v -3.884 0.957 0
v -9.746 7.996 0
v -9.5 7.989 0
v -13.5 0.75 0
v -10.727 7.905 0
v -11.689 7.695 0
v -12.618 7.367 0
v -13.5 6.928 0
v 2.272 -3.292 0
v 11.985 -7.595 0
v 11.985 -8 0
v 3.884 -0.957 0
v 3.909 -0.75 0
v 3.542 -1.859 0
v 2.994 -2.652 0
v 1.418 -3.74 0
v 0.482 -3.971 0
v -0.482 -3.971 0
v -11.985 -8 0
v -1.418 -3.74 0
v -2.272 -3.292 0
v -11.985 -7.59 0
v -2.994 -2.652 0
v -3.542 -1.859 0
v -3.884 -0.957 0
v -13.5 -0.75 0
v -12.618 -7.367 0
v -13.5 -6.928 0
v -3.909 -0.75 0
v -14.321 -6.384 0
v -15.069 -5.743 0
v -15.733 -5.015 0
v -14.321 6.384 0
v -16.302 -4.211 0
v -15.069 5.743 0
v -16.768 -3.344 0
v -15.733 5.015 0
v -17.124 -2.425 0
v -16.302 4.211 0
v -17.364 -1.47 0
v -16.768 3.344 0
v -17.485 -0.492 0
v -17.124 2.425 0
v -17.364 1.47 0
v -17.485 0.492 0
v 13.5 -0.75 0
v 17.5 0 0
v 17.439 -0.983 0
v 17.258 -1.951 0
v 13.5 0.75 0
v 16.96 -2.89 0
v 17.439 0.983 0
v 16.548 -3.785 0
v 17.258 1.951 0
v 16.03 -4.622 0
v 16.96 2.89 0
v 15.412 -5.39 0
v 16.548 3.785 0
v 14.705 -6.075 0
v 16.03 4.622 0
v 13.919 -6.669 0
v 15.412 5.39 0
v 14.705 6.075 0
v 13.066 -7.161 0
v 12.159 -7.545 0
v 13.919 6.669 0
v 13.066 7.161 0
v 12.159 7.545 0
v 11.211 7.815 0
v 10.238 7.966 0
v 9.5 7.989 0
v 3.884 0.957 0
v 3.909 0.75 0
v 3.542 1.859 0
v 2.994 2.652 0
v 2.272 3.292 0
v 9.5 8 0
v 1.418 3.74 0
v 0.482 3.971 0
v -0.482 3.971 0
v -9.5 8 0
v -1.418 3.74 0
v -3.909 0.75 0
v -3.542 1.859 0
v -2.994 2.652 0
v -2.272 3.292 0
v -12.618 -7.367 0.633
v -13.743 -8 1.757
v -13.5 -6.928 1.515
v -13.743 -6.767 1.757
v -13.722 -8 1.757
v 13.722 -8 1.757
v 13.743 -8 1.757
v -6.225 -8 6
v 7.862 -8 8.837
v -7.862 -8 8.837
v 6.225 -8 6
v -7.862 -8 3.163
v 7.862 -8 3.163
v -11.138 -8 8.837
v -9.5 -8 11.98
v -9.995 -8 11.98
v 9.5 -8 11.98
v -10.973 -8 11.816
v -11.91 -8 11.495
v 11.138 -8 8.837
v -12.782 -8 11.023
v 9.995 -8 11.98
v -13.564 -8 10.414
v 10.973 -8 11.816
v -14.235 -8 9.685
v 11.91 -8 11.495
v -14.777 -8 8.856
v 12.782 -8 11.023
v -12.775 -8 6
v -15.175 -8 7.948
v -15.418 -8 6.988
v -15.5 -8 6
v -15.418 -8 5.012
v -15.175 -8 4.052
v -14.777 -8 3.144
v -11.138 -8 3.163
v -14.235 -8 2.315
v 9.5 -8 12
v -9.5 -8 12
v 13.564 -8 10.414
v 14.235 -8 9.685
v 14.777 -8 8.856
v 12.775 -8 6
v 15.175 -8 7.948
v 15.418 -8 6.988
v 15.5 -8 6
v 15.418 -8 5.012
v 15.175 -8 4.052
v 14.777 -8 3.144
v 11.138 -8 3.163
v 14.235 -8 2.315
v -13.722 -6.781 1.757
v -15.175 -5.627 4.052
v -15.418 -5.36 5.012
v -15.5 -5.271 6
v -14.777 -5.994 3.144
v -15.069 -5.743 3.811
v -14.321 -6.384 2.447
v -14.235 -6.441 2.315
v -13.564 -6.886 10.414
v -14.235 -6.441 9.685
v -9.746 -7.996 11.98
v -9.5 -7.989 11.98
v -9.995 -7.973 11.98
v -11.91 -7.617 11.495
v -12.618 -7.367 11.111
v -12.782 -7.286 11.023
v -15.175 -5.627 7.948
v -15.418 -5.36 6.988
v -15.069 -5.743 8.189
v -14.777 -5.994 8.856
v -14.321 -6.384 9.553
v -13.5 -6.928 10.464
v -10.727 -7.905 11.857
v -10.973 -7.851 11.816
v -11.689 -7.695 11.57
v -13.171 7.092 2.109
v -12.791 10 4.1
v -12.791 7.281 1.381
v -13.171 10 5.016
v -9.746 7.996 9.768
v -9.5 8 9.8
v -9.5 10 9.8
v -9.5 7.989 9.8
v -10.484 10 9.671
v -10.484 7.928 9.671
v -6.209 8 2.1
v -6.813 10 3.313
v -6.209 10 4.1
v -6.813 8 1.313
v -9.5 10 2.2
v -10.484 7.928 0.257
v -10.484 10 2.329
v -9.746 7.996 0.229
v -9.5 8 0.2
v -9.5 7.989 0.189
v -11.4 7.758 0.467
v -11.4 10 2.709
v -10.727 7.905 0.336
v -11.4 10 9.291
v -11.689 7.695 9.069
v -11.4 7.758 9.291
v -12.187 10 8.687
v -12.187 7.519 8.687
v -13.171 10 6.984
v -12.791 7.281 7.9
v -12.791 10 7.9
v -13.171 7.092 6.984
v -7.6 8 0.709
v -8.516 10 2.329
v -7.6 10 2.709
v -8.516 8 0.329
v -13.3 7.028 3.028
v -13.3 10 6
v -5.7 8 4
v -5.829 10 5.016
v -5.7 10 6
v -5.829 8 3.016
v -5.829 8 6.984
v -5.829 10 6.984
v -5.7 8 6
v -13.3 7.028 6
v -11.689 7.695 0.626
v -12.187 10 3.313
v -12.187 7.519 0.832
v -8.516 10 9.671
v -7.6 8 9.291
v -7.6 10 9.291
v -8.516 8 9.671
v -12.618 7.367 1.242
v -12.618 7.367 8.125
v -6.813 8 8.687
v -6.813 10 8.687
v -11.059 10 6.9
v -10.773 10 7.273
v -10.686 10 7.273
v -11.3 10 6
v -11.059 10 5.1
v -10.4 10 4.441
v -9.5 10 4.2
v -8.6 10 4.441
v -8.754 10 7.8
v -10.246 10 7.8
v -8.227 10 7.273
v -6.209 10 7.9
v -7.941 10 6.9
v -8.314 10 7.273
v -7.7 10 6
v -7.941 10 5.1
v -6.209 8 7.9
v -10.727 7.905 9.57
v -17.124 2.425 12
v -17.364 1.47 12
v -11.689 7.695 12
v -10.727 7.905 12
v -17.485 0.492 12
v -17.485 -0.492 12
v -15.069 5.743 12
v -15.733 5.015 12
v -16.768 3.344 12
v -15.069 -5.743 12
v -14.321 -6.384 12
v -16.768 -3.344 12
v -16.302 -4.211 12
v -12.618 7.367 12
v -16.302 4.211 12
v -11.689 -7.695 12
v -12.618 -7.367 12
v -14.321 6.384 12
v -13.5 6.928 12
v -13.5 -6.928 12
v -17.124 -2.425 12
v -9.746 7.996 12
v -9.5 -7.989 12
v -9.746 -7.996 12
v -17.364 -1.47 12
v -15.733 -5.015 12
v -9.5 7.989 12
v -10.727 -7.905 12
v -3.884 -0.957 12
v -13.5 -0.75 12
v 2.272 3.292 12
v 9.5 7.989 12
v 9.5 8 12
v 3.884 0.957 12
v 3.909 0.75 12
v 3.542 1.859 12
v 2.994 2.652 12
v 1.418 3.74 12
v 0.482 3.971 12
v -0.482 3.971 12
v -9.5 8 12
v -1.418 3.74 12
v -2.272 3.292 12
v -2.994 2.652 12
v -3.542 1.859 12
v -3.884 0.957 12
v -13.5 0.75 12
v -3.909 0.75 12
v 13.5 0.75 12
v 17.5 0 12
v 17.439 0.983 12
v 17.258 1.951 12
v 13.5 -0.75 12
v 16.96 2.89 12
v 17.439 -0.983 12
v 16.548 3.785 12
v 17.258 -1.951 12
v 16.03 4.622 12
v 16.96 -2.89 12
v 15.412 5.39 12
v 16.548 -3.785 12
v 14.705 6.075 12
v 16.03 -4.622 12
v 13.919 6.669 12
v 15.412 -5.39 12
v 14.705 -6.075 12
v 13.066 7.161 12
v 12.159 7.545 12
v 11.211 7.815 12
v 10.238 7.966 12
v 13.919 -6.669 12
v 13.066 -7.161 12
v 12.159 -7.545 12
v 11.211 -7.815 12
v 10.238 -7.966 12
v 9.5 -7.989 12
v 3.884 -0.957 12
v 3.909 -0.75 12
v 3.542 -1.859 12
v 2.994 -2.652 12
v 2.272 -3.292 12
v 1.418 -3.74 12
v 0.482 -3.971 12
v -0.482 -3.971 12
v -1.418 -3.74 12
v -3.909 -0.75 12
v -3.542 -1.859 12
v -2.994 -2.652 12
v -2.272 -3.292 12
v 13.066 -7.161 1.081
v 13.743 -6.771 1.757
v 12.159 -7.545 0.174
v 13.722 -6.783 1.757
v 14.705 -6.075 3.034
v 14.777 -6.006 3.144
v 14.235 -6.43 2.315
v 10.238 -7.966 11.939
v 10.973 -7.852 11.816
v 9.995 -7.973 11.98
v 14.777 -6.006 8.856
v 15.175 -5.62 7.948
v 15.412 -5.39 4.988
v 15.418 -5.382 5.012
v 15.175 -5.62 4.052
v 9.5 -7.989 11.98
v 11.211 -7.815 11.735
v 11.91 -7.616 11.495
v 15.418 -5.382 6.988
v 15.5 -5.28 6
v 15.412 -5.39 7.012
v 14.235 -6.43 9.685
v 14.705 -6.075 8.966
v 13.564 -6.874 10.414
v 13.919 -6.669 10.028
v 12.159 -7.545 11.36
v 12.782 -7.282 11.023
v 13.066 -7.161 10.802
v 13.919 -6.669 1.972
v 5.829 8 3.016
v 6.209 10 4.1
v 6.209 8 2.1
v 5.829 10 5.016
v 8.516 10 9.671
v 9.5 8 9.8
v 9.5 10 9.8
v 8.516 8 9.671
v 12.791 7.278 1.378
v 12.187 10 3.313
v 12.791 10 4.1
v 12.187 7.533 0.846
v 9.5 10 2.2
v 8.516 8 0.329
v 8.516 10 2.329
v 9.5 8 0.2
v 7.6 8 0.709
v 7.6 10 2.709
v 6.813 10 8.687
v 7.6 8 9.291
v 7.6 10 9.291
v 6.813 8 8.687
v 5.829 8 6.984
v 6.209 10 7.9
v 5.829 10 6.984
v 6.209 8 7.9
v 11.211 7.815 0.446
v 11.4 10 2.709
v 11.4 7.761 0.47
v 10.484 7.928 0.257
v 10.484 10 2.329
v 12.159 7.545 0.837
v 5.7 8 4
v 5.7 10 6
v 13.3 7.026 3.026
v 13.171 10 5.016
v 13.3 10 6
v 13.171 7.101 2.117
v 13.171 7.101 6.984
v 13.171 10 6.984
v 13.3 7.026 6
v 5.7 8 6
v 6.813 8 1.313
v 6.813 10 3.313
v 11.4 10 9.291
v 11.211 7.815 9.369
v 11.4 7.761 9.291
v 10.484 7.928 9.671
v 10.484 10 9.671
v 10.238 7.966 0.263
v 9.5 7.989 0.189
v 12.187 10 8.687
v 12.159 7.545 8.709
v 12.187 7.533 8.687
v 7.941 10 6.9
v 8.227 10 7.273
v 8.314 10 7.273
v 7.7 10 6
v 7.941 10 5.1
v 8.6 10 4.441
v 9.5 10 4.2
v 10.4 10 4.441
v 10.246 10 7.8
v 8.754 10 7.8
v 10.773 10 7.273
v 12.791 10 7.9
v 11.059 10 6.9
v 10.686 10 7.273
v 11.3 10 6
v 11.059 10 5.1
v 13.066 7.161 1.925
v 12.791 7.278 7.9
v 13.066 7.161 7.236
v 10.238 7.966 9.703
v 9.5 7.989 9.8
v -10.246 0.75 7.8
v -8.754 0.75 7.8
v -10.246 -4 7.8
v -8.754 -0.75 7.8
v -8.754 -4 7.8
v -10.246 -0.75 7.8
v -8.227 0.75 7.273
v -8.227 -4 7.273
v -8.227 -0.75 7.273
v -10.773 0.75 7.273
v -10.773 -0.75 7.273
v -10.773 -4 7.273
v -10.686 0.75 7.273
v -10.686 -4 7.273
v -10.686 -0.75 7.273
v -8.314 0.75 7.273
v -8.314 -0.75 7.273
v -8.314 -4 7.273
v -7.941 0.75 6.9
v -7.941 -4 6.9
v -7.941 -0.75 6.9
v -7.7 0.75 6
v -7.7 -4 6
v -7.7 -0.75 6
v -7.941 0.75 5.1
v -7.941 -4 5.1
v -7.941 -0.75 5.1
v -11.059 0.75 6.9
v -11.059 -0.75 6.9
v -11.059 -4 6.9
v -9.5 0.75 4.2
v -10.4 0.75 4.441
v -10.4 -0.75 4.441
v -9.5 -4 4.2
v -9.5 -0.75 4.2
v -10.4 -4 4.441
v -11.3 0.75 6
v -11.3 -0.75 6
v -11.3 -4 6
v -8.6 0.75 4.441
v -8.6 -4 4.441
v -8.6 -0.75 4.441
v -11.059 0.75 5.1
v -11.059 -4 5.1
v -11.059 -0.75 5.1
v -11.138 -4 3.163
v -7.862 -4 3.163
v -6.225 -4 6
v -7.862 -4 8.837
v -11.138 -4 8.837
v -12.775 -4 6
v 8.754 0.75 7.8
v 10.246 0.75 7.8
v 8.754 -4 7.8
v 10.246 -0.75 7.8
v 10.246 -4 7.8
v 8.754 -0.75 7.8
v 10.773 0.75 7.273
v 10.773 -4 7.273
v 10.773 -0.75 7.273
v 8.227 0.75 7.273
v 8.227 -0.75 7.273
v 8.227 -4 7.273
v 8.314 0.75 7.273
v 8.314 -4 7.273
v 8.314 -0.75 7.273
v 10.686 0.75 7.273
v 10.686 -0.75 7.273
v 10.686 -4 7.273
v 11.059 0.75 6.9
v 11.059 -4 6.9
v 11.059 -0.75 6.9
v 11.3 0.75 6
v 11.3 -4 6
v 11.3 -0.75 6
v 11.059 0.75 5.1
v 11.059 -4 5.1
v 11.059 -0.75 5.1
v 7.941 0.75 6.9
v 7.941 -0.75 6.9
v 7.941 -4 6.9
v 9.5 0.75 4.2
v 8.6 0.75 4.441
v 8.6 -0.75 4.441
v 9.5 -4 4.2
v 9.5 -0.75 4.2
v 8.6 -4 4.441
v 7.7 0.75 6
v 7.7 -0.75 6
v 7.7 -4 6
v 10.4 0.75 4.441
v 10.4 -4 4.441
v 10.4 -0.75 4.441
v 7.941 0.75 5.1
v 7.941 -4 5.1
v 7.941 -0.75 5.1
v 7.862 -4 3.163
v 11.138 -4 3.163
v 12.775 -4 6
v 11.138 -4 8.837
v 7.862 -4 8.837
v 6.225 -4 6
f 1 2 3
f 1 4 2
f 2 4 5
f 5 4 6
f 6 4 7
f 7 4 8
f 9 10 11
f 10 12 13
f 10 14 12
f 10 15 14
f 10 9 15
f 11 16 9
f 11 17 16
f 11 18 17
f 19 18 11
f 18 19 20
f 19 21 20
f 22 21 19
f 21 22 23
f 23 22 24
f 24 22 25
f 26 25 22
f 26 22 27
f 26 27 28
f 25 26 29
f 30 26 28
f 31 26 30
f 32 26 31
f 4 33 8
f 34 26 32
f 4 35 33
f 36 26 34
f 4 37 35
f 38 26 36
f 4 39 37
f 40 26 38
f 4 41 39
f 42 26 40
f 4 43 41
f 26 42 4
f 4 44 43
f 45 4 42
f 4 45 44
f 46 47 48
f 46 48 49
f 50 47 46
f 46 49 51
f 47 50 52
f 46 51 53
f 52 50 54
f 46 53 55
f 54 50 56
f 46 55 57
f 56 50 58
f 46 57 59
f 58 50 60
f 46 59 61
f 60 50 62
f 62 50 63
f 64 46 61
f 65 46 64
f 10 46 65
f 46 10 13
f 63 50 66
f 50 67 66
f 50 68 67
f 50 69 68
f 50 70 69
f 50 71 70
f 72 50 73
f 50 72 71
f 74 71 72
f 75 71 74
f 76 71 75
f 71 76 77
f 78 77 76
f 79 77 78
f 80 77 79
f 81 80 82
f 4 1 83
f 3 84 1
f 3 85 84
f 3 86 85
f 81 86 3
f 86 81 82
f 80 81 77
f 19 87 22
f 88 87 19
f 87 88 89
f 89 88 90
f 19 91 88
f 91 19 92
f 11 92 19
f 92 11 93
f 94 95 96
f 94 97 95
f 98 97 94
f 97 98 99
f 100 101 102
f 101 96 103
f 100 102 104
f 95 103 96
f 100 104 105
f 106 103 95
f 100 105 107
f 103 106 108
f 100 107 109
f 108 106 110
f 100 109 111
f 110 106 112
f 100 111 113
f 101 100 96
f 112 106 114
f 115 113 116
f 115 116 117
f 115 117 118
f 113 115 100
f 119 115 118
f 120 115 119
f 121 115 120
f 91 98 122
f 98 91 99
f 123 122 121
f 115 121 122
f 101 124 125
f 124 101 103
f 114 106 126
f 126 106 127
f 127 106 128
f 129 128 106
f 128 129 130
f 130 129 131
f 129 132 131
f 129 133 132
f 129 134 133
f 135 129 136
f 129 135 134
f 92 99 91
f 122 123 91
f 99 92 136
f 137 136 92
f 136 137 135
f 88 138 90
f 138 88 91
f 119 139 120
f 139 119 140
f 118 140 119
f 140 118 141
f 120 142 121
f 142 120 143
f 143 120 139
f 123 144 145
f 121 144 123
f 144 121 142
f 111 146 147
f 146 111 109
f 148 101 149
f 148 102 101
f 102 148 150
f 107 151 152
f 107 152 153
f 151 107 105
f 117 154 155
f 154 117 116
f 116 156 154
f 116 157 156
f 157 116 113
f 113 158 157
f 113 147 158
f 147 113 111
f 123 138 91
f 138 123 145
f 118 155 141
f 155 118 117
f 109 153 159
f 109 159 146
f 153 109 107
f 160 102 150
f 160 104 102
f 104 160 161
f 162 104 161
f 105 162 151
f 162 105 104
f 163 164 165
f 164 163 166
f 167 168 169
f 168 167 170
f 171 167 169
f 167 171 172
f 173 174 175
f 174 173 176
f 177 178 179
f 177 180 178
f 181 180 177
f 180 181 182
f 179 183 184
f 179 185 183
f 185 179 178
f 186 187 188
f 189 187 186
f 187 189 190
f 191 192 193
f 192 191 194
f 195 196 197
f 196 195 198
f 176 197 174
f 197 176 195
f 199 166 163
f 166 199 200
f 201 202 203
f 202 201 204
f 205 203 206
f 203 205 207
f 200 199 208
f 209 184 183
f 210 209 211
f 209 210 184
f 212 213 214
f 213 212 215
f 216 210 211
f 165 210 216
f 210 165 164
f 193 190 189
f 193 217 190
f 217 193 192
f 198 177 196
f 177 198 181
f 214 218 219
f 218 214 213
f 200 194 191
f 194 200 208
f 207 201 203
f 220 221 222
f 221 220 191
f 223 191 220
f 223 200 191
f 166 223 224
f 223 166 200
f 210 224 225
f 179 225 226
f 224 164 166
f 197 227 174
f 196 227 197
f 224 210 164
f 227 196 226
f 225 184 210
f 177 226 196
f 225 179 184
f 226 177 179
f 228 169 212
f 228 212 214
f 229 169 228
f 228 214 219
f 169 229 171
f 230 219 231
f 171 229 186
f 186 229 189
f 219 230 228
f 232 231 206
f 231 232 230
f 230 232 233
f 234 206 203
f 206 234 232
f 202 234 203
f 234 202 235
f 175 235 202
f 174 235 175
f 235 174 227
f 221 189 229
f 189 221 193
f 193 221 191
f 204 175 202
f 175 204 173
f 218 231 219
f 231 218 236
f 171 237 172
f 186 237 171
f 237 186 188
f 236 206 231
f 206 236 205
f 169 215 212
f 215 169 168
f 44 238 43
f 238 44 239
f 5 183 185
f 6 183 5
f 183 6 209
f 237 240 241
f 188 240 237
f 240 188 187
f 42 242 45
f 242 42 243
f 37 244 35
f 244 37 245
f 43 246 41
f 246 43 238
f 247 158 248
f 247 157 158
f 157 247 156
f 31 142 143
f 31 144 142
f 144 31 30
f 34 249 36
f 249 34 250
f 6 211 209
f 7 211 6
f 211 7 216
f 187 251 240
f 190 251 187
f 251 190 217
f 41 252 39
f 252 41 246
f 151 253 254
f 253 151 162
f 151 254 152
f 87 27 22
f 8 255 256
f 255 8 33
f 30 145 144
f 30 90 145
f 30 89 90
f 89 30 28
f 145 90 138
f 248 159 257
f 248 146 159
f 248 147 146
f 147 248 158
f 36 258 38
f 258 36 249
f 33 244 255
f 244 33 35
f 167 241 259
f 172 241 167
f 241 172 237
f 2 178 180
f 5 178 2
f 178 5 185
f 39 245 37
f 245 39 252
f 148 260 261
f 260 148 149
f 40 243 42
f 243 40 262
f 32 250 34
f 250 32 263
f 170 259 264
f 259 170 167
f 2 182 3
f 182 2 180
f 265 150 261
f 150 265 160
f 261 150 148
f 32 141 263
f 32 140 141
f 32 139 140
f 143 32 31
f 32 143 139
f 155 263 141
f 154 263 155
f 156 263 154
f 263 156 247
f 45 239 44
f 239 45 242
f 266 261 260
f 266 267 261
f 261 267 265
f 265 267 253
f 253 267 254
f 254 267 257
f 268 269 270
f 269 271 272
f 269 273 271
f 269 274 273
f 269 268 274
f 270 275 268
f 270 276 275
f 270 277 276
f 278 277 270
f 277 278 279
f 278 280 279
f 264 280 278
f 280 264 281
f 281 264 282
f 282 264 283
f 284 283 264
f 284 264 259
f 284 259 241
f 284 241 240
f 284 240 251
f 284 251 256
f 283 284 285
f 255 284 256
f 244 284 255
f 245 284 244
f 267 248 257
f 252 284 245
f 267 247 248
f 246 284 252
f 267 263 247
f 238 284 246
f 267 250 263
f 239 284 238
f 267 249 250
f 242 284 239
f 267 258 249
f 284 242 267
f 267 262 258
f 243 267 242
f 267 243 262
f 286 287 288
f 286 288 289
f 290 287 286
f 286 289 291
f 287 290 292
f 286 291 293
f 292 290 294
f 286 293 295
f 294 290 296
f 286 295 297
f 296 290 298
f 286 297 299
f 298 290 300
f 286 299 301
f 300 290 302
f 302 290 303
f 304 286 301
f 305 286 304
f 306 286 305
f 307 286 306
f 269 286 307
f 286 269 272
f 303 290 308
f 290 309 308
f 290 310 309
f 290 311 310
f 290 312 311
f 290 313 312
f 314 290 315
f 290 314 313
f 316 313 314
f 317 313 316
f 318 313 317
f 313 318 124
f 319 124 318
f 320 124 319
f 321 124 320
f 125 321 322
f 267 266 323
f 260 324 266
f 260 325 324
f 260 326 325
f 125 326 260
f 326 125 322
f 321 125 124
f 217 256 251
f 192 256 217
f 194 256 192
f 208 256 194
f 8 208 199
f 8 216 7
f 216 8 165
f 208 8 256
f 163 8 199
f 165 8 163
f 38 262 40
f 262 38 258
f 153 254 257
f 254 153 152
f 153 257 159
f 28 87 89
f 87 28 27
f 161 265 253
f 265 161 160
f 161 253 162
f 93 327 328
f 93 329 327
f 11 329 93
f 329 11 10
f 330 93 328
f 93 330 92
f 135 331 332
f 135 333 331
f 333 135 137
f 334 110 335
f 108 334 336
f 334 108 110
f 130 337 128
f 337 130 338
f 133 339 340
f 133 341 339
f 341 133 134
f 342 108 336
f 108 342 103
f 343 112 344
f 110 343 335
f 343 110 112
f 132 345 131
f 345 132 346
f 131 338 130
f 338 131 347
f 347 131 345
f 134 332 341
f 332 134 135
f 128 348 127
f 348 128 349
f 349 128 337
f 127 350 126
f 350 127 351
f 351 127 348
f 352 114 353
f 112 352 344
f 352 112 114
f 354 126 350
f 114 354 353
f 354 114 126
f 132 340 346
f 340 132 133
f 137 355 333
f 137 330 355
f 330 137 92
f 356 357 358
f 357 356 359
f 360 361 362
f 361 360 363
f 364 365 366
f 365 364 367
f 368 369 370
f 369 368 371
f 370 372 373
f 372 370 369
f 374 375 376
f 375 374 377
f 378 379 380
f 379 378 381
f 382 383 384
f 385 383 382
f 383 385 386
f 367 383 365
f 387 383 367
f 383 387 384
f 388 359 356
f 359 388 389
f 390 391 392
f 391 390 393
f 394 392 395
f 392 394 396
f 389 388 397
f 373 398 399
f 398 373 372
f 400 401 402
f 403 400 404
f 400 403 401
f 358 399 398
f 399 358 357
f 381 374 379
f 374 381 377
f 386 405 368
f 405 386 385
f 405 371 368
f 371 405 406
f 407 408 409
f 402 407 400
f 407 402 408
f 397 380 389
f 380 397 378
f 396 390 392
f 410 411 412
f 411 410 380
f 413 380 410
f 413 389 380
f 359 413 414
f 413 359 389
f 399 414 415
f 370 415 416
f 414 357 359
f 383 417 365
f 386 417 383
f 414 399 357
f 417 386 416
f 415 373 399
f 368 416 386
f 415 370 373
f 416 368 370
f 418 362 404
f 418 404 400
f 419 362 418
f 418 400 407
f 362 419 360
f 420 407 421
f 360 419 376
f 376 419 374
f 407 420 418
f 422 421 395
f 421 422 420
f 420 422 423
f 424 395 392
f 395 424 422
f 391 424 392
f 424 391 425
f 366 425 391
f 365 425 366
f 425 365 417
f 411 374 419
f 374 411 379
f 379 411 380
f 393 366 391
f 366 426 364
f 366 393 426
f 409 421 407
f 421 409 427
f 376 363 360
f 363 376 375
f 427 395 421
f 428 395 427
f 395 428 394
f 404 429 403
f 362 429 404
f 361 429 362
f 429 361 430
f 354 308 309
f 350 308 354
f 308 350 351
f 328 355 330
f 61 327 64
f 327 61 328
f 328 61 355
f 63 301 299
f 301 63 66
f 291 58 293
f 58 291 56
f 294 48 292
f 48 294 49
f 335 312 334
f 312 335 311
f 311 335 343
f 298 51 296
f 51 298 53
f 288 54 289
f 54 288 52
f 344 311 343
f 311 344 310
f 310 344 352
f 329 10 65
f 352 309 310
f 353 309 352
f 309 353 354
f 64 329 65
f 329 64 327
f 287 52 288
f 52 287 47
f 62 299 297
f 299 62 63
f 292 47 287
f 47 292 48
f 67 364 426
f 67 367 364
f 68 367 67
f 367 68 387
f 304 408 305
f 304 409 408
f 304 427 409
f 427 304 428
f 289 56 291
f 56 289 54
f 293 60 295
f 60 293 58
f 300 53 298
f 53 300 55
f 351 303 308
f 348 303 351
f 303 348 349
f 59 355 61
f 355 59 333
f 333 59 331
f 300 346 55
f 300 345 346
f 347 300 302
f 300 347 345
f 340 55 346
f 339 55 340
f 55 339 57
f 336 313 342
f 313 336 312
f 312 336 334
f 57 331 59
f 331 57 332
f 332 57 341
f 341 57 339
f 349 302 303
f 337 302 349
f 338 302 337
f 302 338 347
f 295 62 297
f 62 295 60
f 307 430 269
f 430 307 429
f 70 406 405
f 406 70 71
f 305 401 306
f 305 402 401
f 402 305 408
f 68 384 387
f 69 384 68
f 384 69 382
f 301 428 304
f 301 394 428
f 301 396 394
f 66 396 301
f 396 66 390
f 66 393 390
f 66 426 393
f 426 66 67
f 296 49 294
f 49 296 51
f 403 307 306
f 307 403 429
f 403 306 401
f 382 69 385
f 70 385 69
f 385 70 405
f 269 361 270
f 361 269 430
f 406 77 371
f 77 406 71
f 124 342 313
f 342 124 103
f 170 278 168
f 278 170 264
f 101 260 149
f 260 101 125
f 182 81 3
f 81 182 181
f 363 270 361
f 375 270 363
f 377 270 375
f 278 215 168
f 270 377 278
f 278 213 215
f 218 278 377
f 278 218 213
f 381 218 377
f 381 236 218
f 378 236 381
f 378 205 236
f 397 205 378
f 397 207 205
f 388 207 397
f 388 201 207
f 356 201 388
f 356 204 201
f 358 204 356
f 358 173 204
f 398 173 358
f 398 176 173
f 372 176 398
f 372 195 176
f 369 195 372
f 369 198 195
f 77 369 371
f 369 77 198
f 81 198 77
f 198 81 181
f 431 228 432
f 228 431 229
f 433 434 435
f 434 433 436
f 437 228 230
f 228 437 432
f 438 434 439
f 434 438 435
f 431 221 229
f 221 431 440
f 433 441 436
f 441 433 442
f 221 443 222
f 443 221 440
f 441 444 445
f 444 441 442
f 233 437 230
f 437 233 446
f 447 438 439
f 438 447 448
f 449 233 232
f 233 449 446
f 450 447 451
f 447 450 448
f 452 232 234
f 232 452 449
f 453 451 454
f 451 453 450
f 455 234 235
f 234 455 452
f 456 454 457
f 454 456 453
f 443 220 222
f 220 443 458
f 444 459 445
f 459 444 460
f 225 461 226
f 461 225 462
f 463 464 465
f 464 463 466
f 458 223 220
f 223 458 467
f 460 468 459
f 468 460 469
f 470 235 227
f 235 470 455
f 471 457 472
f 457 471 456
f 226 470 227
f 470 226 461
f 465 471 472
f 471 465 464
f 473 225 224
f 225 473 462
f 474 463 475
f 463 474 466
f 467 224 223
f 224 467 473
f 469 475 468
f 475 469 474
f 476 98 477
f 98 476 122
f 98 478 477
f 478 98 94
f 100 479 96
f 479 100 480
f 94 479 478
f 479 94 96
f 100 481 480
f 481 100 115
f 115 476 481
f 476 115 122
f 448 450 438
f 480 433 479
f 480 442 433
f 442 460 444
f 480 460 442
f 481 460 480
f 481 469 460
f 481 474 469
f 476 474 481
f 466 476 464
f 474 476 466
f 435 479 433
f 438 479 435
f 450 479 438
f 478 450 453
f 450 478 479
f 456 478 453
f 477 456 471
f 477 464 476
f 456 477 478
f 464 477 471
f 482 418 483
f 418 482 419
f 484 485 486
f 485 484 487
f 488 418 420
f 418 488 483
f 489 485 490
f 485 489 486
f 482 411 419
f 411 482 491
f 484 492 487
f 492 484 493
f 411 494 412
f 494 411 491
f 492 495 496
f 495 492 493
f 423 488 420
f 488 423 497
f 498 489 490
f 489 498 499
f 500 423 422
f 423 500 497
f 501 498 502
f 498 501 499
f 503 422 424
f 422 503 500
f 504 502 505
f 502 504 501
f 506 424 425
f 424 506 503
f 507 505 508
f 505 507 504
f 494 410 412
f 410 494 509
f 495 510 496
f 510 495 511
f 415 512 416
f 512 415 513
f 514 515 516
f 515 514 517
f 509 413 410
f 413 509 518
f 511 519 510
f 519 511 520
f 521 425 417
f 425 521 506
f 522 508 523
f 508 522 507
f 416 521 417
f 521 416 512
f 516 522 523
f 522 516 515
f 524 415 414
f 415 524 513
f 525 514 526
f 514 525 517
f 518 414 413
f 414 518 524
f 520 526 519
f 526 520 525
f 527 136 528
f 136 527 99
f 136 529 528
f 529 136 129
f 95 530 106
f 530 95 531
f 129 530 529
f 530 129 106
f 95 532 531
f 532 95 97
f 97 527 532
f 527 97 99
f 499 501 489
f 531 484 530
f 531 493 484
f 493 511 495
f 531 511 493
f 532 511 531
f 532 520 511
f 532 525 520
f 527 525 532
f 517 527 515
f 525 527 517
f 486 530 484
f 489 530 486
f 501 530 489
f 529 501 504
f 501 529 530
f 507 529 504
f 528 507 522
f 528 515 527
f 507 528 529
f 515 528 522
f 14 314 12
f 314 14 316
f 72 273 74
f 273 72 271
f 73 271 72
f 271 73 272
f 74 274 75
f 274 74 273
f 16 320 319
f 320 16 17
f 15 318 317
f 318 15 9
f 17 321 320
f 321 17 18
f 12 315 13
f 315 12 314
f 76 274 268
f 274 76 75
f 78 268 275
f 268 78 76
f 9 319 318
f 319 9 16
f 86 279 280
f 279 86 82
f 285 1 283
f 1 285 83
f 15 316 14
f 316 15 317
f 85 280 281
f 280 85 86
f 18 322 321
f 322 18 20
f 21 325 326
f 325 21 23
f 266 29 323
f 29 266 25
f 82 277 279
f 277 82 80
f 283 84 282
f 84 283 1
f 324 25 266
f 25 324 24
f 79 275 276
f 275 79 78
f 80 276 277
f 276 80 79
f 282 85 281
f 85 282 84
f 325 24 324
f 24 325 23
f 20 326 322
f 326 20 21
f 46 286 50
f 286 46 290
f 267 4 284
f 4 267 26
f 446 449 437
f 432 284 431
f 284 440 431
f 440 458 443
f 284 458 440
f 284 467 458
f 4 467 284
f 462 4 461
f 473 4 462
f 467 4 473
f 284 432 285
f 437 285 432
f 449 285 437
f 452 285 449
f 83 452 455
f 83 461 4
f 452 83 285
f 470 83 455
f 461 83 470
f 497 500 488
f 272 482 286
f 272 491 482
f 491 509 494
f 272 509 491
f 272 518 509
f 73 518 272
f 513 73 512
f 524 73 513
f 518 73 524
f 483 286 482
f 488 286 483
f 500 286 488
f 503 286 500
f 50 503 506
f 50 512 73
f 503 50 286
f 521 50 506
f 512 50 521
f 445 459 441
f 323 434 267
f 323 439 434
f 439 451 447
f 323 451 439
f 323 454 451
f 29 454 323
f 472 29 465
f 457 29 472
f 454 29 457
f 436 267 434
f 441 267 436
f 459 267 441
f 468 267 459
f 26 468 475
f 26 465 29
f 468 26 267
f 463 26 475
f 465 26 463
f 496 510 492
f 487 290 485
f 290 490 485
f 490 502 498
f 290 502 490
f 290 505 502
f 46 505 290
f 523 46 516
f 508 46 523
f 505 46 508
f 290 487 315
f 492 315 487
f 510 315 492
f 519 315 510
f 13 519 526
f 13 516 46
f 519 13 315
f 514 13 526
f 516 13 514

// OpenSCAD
// file: configuration.scad
//
// RepRap Mendel Akimbo
//
// A Mendel variant, which improves the frame's clearance and stability
//  by increasing it's triangulation.
//
// Copyright 2012 by Ron Aldrich.
//
// Licensed under GNU GPL v2
//
//	configuration.scad
//
//	General configuration settings.
//
//	Because this file is intended to be somewhat interchangable with 
//		configuration.scad from prusajr's github repository, there is 
//		more configuration in "moreConfiguration.scad".
//
//  Only the metric variant is tested. Other variants are not supported, and will most likely
//    create unworkable parts.
//
//	Edit layer_height to be greater than the height of one printed layer, 
//		but less than the height of two printed layers.
//


metric = 0;	// All parts are metric - use both M3 and M4 bolts.
sae = 1;		// All parts are SAE - use only #6/32 bolts.
m3only = 2;	// All parts are metric, but use only M3 bolts.
hybrid = 3;	// Mix of metric and SAE - use M3 and 6/32 bolts.

variant = metric;

layer_height = .25;

nut_slop = .2;		// I aim for a "interference fit" for nuts - a bit of force required to place the nut.

bolt_slop = .6;	// The aim here is to just barely allow the bolt to fit through the hole, without having to thread it in.

_actual_m3_diameter = 3+bolt_slop;
_actual_m4_diameter = 4+bolt_slop;
_actual_6_32_diameter = 3.4+bolt_slop;

_actual_m3_nut_diameter = 5.5/cos(30)+nut_slop;
_actual_m4_nut_diameter = 6.87/cos(30)+nut_slop;
_actual_m5_nut_diameter = 7.85/cos(30)+nut_slop;
_actual_6_32_nut_diameter = 7.85/cos(30)+nut_slop;

_m3_diameters = [_actual_m3_diameter, _actual_6_32_diameter, _actual_m3_diameter, _actual_m3_diameter];
_m3_nut_diameters = [_actual_m3_nut_diameter, _actual_6_32_nut_diameter, _actual_m3_nut_diameter, _actual_m3_nut_diameter];

_m4_diameters = [_actual_m4_diameter, _actual_6_32_diameter, _actual_m3_diameter, _actual_6_32_diameter];
_m4_nut_diameters = [_actual_m4_nut_diameter, _actual_6_32_nut_diameter, _actual_m3_nut_diameter, _actual_6_32_nut_diameter];

m3_diameter = _m3_diameters[variant];
m3_nut_diameter = _m3_nut_diameters[variant];

m4_diameter = _m4_diameters[variant];
m4_nut_diameter = _m4_nut_diameters[variant];

m5_diameter = 5+bolt_slop;
m5_nut_diameter = _actual_m5_nut_diameter;
m5_bolt_head_height = 4;

m6_diameter = 6+bolt_slop;
m6_nut_diameter = 10/cos(30)+nut_slop;
m6_bolt_head_height = 4;

m8_diameter = 8;

m8_nut_diameter = 12.8/cos(30)+nut_slop;
m8_nut_thickness = 7.7;
m8_bolt_head_height = 6;
m8_half_nut_height = 3.85;

threaded_rod_diameter = 8.7;

actual_smooth_rod_diameter = 8;
smooth_rod_diameter = actual_smooth_rod_diameter+.25;
// file: optical_endstop.scad
X=0;
Y=1;
Z=2;

function endstop_bolt_spacing() = 19;
bolt_spacing = endstop_bolt_spacing();


circuit_size = [16, 30, 1.5];
endstop_size = [6, 24, 13];
endstop_void_size = [6, 3.5, 7.5];

circuit_center = [(circuit_size[X]-endstop_size[X])/2, -(circuit_size[Y]-endstop_size[Y])/2, circuit_size[Z]/2];
endstop_center = [0, 0, endstop_size[Z]/2];
endstop_void_center = [0, 0, endstop_size[Z]-endstop_void_size[Z]/2];

module optical_endstop_solid()
{
	translate(circuit_center)
	cube(circuit_size, center=true);

	translate(endstop_center+[0, 0, -.05])
	cube(endstop_size+[0, 0, .1], center=true);
}

module optical_endstop_void()
{
	translate(endstop_void_center+[0, 0, .05])
	cube(endstop_void_size+[.1, 0, .1], center=true);
}

module optical_endstop()
{
	difference()
	{
		optical_endstop_solid();
		optical_endstop_void();
	}
}

optical_endstop();
// file: functions.scad
//
// RepRap Mendel Akimbo
//
// A Mendel variant, which improves the frame's clearance and stability
//  by increasing it's triangulation.
//
// Copyright 2012 by Ron Aldrich.
//
// Licensed under GNU GPL v2
//
// functions.scad
//
// Functions commonly used within Akimbo's sources.
//

x=0;
y=1;
z=2;

function average(va, vb) = [
	(va[x]+vb[x])/2,
	(va[y]+vb[y])/2,
	(va[z]+vb[z])/2];

function centerof(a, b) = [(a[x]+b[x])/2, (a[y]+b[y])/2, (a[z]+b[z])/2];
function sizeof(a, b) = [abs(b[x]-a[x]), abs(b[y]-a[y]), abs(b[z]-a[z])];
function minof(a, b) = [a[x]-b[x]/2, a[y]-b[y]/2, a[z]-b[z]/2];
function maxof(a, b) = [a[x]+b[x]/2, a[y]+b[y]/2, a[z]+b[z]/2];

function centerof_2(a, b) = [(a[x]+b[x])/2, (a[y]+b[y])/2];
function sizeof_2(a, b) = [abs(b[x]-a[x]), abs(b[y]-a[y])];
function minof_2(a, b) = [a[x]-b[x]/2, a[y]-b[y]/2];
function maxof_2(a, b) = [a[x]+b[x]/2, a[y]+b[y]/2];
function vec_length_2(a) = sqrt(a[x]*a[x]+a[y]*a[y]);

function pitch_radius(number_of_teeth, modulus=1) = number_of_teeth * modulus / 2;

function rotate_vec(v,a)=[cos(a)*v[0]-sin(a)*v[1],sin(a)*v[0]+cos(a)*v[1]];

function matrix_multiply(a, b) = [
	[a[0][0]*b[0][0]+a[0][1]*b[1][0]+a[0][2]*b[2][0], a[0][0]*b[0][1]+a[0][1]*b[1][1]+a[0][2]*b[2][1], a[0][0]*b[0][2]+a[0][1]*b[1][2]+a[0][2]*b[2][2]],
	[a[1][0]*b[0][0]+a[1][1]*b[1][0]+a[1][2]*b[2][0], a[1][0]*b[0][1]+a[1][1]*b[1][1]+a[1][2]*b[2][1], a[1][0]*b[0][2]+a[1][1]*b[1][2]+a[1][2]*b[2][2]],
	[a[2][0]*b[0][0]+a[2][1]*b[1][0]+a[2][2]*b[2][0], a[2][0]*b[0][1]+a[2][1]*b[1][1]+a[2][2]*b[2][1], a[2][0]*b[0][2]+a[2][1]*b[1][2]+a[2][2]*b[2][2]]
];

function matrix_rotate_x(t) = [ [1, 0, 0], [0, cos(t), -sin(t)], [0, sin(t), cos(t)] ];
function matrix_rotate_y(t) = [ [cos(t), 0, sin(t)], [0, 1, 0], [-sin(t), 0, cos(t)] ];
function matrix_rotate_z(t) = [ [cos(t), -sin(t), 0], [sin(t), cos(t), 0], [0, 0, 1] ];

function matrix_rotate(a) = matrix_multiply( matrix_multiply(matrix_rotate_x(a[x]), matrix_rotate_y(a[y])), matrix_rotate_z(a[z]) );


function vector_rotate(v, a) = matrix_multiply([v, [0, 0, 0], [0, 0, 0]], matrix_rotate(a))[0];
// file: teardrops.scad
//
// RepRap Mendel Akimbo
//
// A Mendel variant, which improves the frame's clearance and stability
//  by increasing it's triangulation.
//
// Copyright 2012 by Ron Aldrich.
//
// Licensed under GNU GPL v2
//
// teardrops.scad
//
// Generates 2d and 3d teardrop profiles.
//

module hexircle(r, $fn)
{
	intersection()
	{
		circle(r=r/cos(30), $fn=6);
		translate([0, r*3/4])
		square([r*2, r/2], center=true);
	}

	rotate([0, 0, 180/$fn])
	circle(r=r, $fn=$fn);
}

module teardrop(h, r, center=false, $fn)
{
	render(convexity=1)
	cylinder(h=h, r=r, center=center, $fn=$fn);
	translate([0, r/2*sqrt(2), 0])
	cylinder(h=h, r=r*cos(45), center=center, $fn=4);
}

octircle(h=1, r=10, $fn=40, center=true);

module hexylinder(h, r, center=false, $fn)
{
	render(convexity=1)
	intersection()
	{
		rotate([0, 0, 0])
		cylinder(h=h, r=r/cos(30), center=center, $fn=6);
		if (center)
		{
			translate([0, r*3/4, 0])
			cube([r*2, r/2, h+.1], center=true);
		}
		else
		{
			translate([0, r*3/4, h/2])
			cube([r*2, r/2, h+.1], center=true);
		}
	}
	rotate([0, 0, 180/$fn])
	cylinder(h=h, r=r, $fn=$fn, center=center);
}

module hexasphere(r, $fn)
{
	render(convexity=1)
	{
		intersection()
		{
			cylinder(h=r, r1=r/cos(30), r2=r/cos(30)/2, $fn=$fn);
			translate([0, 0, r*3/4])
			cube([r*2, r*2, r/2], center=true);
		}
		sphere(r, $fn);
	}
}

module octircle(r, $fn)
{
	a=r/(1+sqrt(2));
	b=(r-a)/2;

	intersection()
	{
		rotate(45/2)
		circle(r=r/cos(45/2), $fn=8);
		translate([0, r-b/2])
		square([r*2, b], center=true);
	}

	rotate(180/$fn)
	circle(r=r, $fn=$fn);
}

module octylinder(h, r, center=false, $fn)
{
	a=r/(1+sqrt(2));
	b=(r-a)/2;

	render(convexity=1)
	intersection()
	{
		rotate([0, 0, 45/2])
		cylinder(h=h, r=r/cos(45/2), center=center, $fn=8);
		if (center)
		{
			translate([0, r-b/2, 0])
			cube([r*2, b, h+.1], center=true);
		}
		else
		{
			translate([0, r-b/2, h/2])
			cube([r*2, b, h+.1], center=true);
		}
	}
	//rotate([0, 0, 180/$fn])
	cylinder(h=h, r=r, $fn=$fn, center=center);
}

module octasphere(r, $fn)
{
	a=r/(1+sqrt(2));
	b=(r-a)/2;

	render(convexity=1)
	intersection()
	{
		translate([0, 0, a])
		cylinder(h=r-a, r1=r, r2=a, $fn=$fn);
		translate([0, 0, r-b/2])
		cube([r*2, r*2, b], center=true);
	}
	sphere(r, $fn=$fn);
}
// file: more_configuration.scad
//
// RepRap Mendel Akimbo
//
// A Mendel variant, which improves the frame's clearance and stability
//  by increasing it's triangulation.
//
// Copyright 2012 by Ron Aldrich.
//
// Licensed under GNU GPL v2
//
// moreConfiguration.scad
//
//	General configuration settings that didn't exist in prusajr's configuration.scad
//
//	These settings are here, rather than in configuration.scad, in
//		order to keep configuration.scad interchangable with prusajr.s version.
//
// Edit extrusion_width to be greater than the width of one shell, but less than the width of two shells.

include <configuration.scad>

extrusion_width = .6;

vertical_slop = .6;
horizontal_slop = .3;

_actual_m3_nut_thickness = 2.5;
_actual_m4_nut_thickness = 3.5;
_actual_6_32_nut_thickness = 3.25;

_m3_nut_thickness = [_actual_m3_nut_thickness, _actual_6_32_nut_thickness, _actual_m3_nut_thickness, _actual_m3_nut_thickness];

_m4_nut_thickness = [_actual_m4_nut_thickness, _actual_6_32_nut_thickness, _actual_m3_nut_thickness, _actual_6_32_nut_thickness];

m3_nut_thickness = _m3_nut_thickness[variant];
m3_washer_diameter = 7.5;

m4_nut_thickness = _m4_nut_thickness[variant];

m3_bolt_head_height = 3;
m3_bolt_head_diameter = 6+horizontal_slop;

m4_bolt_head_height = 4;
m4_bolt_head_diameter = 7+horizontal_slop;

// Don't edit things after here.

x = 0;
y = 1;
z = 2;

bearing_length = 0;
bearing_body_diameter = 1;
bearing_flange_diameter = 2;
bearing_flange_width = 3;
bearing_rod_diameter = 4;

// linear_roller_bearing = [2, 6, 6, 0, 3];

683_bearing = [3, 7, 7, 0, 3];
683_bearing_clearance = [0.4, 0.4, 0.4, 0, 2];

623_bearing = [4, 10, 10, 0, 6];
623_bearing_clearance = [0.4, 0.4, 0.4, 0, 2];

624_bearing = [5, 13, 13, 0, 4];
624_bearing_clearance = [0.4, 0.4, 0.4, 0, 2];

608_bearing = [7, 22, 22, 0, 8];
608_bearing_clearance = [0.4, 0.4, 0.4, 0, 2];

115_bearing = [4, 11, 11, 0, 5];
115_bearing_clearance = [0.4, 0.4, 0.4, 0, 3];

106_bearing = [3, 10, 10, 0, 6];
106_bearing_clearance = [0.4, 0.4, 0.4, 0, 0];

126_bearing = [4, 12, 12, 0, 6];
126_bearing_clearance = [0.4, 0.4, 0.4, 0, 3];

128_bearing = [3.5, 12, 12, 0, 8];
128_bearing_clearance = [0.4, 0.4, 0.4, 4];

lm8uu = [24, 15, 15, 0, 8];
lm8uu_clearance = [0.4, 0.4, 0.4, 0, 0];

igus = [10, 10, 15, 1, 8];
igus_clearance = [0.4, 0.4, 0.4, 0.4, 0];

part_color_1 = [1, .9, 0];
part_color_2 = [.9, 1, 0];

wood_color_1 = [111/256, 78/256, 55/256];
wood_color_2 = wood_color_1+[.2, .2, .2];
wood_color_3 = wood_color_1-[.2, .2, .2];

nema17_hole_spacing = 1.25*25.4;

ramps_size = [102, 60];

ramps_mounts = [[-35.76, -20.86],
                [-35.76, 27.4],
                [39.17, 27.4],
                [45.52, -20.86]];

//echo(ramps_mounts);
// main file
include <more_configuration.scad>

use <teardrops.scad>
use <functions.scad>
use <optical_endstop.scad>

$fa=1;
$fs=1;

print_orientation = false;

smooth_rod_clamp_radius = 4;

endstop_bolt_spacing = 19;
endstop_button_height = 2;
endstop_button_radius = m3_diameter/2+2;

clamp_body_radius = 8;
clamp_body_size = [endstop_bolt_spacing, clamp_body_radius*2, 12];
clamp_body_center = [0, 0, clamp_body_size[z]/2];

akimbo_z_endstop_mount(print_orientation = print_orientation);

%akimbo_z_endstop_annotations(print_orientation = print_orientation);

module akimbo_z_endstop_mount(print_orientation)
{
	p1 = (print_orientation == true) ? 1 : 0;
	p2 = (print_orientation == false) ? 1 : 0;

	difference()
	{
		akimbo_z_endstop_mount_solid();
		akimbo_z_endstop_mount_void();
	}
}

module akimbo_z_endstop_mount_solid()
{
	translate(clamp_body_center)
	cube(clamp_body_size, center=true);

	for(i=[-1, 1])
		translate(clamp_body_center+[i*endstop_bolt_spacing/2, 0, 0])
		{
			cylinder(h=clamp_body_size[z], r=clamp_body_radius, center=true);

			translate([0, -(clamp_body_size[y]/2-2), 0])
			rotate([90, 0, 0])
			rotate([0, 0, 180])
			octylinder(h=4, r=clamp_body_size[z]/2, center=true);

			intersection()
			{
				hull()
				{
					translate([0, (clamp_body_size[y])/2, 0])
					rotate([90, 0, 0])
					cylinder(h=endstop_button_height*2, r=endstop_button_radius, center=true);

					rotate([-90, 0, 0])
					translate([0, (clamp_body_size[y])/2, 0])
					rotate([90, 0, 0])
					cylinder(h=endstop_button_height*2, r=endstop_button_radius, center=true);
				}

				cube([endstop_button_radius*2+.1, clamp_body_size[y]+endstop_button_height*2+.1, clamp_body_size[z]], center=true);
			}
		}
}

module akimbo_z_endstop_mount_void()
{
	translate(clamp_body_center)
	{
		cylinder(h=clamp_body_size[z]+.1, r=smooth_rod_clamp_radius, center=true);

		cube([clamp_body_size[x]+clamp_body_radius, 1.5, clamp_body_size[z]+.1], center=true);

		for(i=[-1, 1])
			translate([i*endstop_bolt_spacing/2, 0, 0])
			rotate([90, 0, 0])
			{
				octylinder(h=clamp_body_size[y]+endstop_button_height*2+.1, r=m3_diameter/2, $fn=12, center=true);
				translate([0, 0, 4])
				cylinder(h=10, r=m3_nut_diameter/2, $fn=6, center=false);
			}
	}
}

module akimbo_z_endstop_annotations(print_orientation)
{
	if (print_orientation == false)
	{
		translate([0, clamp_body_center[y]+clamp_body_size[y]/2+endstop_button_height+.05, clamp_body_center[z]])
		rotate([90, 0, 0])
		rotate([0, 0, 90])
		rotate([0, 180, 0])
		optical_endstop();
	}
}
